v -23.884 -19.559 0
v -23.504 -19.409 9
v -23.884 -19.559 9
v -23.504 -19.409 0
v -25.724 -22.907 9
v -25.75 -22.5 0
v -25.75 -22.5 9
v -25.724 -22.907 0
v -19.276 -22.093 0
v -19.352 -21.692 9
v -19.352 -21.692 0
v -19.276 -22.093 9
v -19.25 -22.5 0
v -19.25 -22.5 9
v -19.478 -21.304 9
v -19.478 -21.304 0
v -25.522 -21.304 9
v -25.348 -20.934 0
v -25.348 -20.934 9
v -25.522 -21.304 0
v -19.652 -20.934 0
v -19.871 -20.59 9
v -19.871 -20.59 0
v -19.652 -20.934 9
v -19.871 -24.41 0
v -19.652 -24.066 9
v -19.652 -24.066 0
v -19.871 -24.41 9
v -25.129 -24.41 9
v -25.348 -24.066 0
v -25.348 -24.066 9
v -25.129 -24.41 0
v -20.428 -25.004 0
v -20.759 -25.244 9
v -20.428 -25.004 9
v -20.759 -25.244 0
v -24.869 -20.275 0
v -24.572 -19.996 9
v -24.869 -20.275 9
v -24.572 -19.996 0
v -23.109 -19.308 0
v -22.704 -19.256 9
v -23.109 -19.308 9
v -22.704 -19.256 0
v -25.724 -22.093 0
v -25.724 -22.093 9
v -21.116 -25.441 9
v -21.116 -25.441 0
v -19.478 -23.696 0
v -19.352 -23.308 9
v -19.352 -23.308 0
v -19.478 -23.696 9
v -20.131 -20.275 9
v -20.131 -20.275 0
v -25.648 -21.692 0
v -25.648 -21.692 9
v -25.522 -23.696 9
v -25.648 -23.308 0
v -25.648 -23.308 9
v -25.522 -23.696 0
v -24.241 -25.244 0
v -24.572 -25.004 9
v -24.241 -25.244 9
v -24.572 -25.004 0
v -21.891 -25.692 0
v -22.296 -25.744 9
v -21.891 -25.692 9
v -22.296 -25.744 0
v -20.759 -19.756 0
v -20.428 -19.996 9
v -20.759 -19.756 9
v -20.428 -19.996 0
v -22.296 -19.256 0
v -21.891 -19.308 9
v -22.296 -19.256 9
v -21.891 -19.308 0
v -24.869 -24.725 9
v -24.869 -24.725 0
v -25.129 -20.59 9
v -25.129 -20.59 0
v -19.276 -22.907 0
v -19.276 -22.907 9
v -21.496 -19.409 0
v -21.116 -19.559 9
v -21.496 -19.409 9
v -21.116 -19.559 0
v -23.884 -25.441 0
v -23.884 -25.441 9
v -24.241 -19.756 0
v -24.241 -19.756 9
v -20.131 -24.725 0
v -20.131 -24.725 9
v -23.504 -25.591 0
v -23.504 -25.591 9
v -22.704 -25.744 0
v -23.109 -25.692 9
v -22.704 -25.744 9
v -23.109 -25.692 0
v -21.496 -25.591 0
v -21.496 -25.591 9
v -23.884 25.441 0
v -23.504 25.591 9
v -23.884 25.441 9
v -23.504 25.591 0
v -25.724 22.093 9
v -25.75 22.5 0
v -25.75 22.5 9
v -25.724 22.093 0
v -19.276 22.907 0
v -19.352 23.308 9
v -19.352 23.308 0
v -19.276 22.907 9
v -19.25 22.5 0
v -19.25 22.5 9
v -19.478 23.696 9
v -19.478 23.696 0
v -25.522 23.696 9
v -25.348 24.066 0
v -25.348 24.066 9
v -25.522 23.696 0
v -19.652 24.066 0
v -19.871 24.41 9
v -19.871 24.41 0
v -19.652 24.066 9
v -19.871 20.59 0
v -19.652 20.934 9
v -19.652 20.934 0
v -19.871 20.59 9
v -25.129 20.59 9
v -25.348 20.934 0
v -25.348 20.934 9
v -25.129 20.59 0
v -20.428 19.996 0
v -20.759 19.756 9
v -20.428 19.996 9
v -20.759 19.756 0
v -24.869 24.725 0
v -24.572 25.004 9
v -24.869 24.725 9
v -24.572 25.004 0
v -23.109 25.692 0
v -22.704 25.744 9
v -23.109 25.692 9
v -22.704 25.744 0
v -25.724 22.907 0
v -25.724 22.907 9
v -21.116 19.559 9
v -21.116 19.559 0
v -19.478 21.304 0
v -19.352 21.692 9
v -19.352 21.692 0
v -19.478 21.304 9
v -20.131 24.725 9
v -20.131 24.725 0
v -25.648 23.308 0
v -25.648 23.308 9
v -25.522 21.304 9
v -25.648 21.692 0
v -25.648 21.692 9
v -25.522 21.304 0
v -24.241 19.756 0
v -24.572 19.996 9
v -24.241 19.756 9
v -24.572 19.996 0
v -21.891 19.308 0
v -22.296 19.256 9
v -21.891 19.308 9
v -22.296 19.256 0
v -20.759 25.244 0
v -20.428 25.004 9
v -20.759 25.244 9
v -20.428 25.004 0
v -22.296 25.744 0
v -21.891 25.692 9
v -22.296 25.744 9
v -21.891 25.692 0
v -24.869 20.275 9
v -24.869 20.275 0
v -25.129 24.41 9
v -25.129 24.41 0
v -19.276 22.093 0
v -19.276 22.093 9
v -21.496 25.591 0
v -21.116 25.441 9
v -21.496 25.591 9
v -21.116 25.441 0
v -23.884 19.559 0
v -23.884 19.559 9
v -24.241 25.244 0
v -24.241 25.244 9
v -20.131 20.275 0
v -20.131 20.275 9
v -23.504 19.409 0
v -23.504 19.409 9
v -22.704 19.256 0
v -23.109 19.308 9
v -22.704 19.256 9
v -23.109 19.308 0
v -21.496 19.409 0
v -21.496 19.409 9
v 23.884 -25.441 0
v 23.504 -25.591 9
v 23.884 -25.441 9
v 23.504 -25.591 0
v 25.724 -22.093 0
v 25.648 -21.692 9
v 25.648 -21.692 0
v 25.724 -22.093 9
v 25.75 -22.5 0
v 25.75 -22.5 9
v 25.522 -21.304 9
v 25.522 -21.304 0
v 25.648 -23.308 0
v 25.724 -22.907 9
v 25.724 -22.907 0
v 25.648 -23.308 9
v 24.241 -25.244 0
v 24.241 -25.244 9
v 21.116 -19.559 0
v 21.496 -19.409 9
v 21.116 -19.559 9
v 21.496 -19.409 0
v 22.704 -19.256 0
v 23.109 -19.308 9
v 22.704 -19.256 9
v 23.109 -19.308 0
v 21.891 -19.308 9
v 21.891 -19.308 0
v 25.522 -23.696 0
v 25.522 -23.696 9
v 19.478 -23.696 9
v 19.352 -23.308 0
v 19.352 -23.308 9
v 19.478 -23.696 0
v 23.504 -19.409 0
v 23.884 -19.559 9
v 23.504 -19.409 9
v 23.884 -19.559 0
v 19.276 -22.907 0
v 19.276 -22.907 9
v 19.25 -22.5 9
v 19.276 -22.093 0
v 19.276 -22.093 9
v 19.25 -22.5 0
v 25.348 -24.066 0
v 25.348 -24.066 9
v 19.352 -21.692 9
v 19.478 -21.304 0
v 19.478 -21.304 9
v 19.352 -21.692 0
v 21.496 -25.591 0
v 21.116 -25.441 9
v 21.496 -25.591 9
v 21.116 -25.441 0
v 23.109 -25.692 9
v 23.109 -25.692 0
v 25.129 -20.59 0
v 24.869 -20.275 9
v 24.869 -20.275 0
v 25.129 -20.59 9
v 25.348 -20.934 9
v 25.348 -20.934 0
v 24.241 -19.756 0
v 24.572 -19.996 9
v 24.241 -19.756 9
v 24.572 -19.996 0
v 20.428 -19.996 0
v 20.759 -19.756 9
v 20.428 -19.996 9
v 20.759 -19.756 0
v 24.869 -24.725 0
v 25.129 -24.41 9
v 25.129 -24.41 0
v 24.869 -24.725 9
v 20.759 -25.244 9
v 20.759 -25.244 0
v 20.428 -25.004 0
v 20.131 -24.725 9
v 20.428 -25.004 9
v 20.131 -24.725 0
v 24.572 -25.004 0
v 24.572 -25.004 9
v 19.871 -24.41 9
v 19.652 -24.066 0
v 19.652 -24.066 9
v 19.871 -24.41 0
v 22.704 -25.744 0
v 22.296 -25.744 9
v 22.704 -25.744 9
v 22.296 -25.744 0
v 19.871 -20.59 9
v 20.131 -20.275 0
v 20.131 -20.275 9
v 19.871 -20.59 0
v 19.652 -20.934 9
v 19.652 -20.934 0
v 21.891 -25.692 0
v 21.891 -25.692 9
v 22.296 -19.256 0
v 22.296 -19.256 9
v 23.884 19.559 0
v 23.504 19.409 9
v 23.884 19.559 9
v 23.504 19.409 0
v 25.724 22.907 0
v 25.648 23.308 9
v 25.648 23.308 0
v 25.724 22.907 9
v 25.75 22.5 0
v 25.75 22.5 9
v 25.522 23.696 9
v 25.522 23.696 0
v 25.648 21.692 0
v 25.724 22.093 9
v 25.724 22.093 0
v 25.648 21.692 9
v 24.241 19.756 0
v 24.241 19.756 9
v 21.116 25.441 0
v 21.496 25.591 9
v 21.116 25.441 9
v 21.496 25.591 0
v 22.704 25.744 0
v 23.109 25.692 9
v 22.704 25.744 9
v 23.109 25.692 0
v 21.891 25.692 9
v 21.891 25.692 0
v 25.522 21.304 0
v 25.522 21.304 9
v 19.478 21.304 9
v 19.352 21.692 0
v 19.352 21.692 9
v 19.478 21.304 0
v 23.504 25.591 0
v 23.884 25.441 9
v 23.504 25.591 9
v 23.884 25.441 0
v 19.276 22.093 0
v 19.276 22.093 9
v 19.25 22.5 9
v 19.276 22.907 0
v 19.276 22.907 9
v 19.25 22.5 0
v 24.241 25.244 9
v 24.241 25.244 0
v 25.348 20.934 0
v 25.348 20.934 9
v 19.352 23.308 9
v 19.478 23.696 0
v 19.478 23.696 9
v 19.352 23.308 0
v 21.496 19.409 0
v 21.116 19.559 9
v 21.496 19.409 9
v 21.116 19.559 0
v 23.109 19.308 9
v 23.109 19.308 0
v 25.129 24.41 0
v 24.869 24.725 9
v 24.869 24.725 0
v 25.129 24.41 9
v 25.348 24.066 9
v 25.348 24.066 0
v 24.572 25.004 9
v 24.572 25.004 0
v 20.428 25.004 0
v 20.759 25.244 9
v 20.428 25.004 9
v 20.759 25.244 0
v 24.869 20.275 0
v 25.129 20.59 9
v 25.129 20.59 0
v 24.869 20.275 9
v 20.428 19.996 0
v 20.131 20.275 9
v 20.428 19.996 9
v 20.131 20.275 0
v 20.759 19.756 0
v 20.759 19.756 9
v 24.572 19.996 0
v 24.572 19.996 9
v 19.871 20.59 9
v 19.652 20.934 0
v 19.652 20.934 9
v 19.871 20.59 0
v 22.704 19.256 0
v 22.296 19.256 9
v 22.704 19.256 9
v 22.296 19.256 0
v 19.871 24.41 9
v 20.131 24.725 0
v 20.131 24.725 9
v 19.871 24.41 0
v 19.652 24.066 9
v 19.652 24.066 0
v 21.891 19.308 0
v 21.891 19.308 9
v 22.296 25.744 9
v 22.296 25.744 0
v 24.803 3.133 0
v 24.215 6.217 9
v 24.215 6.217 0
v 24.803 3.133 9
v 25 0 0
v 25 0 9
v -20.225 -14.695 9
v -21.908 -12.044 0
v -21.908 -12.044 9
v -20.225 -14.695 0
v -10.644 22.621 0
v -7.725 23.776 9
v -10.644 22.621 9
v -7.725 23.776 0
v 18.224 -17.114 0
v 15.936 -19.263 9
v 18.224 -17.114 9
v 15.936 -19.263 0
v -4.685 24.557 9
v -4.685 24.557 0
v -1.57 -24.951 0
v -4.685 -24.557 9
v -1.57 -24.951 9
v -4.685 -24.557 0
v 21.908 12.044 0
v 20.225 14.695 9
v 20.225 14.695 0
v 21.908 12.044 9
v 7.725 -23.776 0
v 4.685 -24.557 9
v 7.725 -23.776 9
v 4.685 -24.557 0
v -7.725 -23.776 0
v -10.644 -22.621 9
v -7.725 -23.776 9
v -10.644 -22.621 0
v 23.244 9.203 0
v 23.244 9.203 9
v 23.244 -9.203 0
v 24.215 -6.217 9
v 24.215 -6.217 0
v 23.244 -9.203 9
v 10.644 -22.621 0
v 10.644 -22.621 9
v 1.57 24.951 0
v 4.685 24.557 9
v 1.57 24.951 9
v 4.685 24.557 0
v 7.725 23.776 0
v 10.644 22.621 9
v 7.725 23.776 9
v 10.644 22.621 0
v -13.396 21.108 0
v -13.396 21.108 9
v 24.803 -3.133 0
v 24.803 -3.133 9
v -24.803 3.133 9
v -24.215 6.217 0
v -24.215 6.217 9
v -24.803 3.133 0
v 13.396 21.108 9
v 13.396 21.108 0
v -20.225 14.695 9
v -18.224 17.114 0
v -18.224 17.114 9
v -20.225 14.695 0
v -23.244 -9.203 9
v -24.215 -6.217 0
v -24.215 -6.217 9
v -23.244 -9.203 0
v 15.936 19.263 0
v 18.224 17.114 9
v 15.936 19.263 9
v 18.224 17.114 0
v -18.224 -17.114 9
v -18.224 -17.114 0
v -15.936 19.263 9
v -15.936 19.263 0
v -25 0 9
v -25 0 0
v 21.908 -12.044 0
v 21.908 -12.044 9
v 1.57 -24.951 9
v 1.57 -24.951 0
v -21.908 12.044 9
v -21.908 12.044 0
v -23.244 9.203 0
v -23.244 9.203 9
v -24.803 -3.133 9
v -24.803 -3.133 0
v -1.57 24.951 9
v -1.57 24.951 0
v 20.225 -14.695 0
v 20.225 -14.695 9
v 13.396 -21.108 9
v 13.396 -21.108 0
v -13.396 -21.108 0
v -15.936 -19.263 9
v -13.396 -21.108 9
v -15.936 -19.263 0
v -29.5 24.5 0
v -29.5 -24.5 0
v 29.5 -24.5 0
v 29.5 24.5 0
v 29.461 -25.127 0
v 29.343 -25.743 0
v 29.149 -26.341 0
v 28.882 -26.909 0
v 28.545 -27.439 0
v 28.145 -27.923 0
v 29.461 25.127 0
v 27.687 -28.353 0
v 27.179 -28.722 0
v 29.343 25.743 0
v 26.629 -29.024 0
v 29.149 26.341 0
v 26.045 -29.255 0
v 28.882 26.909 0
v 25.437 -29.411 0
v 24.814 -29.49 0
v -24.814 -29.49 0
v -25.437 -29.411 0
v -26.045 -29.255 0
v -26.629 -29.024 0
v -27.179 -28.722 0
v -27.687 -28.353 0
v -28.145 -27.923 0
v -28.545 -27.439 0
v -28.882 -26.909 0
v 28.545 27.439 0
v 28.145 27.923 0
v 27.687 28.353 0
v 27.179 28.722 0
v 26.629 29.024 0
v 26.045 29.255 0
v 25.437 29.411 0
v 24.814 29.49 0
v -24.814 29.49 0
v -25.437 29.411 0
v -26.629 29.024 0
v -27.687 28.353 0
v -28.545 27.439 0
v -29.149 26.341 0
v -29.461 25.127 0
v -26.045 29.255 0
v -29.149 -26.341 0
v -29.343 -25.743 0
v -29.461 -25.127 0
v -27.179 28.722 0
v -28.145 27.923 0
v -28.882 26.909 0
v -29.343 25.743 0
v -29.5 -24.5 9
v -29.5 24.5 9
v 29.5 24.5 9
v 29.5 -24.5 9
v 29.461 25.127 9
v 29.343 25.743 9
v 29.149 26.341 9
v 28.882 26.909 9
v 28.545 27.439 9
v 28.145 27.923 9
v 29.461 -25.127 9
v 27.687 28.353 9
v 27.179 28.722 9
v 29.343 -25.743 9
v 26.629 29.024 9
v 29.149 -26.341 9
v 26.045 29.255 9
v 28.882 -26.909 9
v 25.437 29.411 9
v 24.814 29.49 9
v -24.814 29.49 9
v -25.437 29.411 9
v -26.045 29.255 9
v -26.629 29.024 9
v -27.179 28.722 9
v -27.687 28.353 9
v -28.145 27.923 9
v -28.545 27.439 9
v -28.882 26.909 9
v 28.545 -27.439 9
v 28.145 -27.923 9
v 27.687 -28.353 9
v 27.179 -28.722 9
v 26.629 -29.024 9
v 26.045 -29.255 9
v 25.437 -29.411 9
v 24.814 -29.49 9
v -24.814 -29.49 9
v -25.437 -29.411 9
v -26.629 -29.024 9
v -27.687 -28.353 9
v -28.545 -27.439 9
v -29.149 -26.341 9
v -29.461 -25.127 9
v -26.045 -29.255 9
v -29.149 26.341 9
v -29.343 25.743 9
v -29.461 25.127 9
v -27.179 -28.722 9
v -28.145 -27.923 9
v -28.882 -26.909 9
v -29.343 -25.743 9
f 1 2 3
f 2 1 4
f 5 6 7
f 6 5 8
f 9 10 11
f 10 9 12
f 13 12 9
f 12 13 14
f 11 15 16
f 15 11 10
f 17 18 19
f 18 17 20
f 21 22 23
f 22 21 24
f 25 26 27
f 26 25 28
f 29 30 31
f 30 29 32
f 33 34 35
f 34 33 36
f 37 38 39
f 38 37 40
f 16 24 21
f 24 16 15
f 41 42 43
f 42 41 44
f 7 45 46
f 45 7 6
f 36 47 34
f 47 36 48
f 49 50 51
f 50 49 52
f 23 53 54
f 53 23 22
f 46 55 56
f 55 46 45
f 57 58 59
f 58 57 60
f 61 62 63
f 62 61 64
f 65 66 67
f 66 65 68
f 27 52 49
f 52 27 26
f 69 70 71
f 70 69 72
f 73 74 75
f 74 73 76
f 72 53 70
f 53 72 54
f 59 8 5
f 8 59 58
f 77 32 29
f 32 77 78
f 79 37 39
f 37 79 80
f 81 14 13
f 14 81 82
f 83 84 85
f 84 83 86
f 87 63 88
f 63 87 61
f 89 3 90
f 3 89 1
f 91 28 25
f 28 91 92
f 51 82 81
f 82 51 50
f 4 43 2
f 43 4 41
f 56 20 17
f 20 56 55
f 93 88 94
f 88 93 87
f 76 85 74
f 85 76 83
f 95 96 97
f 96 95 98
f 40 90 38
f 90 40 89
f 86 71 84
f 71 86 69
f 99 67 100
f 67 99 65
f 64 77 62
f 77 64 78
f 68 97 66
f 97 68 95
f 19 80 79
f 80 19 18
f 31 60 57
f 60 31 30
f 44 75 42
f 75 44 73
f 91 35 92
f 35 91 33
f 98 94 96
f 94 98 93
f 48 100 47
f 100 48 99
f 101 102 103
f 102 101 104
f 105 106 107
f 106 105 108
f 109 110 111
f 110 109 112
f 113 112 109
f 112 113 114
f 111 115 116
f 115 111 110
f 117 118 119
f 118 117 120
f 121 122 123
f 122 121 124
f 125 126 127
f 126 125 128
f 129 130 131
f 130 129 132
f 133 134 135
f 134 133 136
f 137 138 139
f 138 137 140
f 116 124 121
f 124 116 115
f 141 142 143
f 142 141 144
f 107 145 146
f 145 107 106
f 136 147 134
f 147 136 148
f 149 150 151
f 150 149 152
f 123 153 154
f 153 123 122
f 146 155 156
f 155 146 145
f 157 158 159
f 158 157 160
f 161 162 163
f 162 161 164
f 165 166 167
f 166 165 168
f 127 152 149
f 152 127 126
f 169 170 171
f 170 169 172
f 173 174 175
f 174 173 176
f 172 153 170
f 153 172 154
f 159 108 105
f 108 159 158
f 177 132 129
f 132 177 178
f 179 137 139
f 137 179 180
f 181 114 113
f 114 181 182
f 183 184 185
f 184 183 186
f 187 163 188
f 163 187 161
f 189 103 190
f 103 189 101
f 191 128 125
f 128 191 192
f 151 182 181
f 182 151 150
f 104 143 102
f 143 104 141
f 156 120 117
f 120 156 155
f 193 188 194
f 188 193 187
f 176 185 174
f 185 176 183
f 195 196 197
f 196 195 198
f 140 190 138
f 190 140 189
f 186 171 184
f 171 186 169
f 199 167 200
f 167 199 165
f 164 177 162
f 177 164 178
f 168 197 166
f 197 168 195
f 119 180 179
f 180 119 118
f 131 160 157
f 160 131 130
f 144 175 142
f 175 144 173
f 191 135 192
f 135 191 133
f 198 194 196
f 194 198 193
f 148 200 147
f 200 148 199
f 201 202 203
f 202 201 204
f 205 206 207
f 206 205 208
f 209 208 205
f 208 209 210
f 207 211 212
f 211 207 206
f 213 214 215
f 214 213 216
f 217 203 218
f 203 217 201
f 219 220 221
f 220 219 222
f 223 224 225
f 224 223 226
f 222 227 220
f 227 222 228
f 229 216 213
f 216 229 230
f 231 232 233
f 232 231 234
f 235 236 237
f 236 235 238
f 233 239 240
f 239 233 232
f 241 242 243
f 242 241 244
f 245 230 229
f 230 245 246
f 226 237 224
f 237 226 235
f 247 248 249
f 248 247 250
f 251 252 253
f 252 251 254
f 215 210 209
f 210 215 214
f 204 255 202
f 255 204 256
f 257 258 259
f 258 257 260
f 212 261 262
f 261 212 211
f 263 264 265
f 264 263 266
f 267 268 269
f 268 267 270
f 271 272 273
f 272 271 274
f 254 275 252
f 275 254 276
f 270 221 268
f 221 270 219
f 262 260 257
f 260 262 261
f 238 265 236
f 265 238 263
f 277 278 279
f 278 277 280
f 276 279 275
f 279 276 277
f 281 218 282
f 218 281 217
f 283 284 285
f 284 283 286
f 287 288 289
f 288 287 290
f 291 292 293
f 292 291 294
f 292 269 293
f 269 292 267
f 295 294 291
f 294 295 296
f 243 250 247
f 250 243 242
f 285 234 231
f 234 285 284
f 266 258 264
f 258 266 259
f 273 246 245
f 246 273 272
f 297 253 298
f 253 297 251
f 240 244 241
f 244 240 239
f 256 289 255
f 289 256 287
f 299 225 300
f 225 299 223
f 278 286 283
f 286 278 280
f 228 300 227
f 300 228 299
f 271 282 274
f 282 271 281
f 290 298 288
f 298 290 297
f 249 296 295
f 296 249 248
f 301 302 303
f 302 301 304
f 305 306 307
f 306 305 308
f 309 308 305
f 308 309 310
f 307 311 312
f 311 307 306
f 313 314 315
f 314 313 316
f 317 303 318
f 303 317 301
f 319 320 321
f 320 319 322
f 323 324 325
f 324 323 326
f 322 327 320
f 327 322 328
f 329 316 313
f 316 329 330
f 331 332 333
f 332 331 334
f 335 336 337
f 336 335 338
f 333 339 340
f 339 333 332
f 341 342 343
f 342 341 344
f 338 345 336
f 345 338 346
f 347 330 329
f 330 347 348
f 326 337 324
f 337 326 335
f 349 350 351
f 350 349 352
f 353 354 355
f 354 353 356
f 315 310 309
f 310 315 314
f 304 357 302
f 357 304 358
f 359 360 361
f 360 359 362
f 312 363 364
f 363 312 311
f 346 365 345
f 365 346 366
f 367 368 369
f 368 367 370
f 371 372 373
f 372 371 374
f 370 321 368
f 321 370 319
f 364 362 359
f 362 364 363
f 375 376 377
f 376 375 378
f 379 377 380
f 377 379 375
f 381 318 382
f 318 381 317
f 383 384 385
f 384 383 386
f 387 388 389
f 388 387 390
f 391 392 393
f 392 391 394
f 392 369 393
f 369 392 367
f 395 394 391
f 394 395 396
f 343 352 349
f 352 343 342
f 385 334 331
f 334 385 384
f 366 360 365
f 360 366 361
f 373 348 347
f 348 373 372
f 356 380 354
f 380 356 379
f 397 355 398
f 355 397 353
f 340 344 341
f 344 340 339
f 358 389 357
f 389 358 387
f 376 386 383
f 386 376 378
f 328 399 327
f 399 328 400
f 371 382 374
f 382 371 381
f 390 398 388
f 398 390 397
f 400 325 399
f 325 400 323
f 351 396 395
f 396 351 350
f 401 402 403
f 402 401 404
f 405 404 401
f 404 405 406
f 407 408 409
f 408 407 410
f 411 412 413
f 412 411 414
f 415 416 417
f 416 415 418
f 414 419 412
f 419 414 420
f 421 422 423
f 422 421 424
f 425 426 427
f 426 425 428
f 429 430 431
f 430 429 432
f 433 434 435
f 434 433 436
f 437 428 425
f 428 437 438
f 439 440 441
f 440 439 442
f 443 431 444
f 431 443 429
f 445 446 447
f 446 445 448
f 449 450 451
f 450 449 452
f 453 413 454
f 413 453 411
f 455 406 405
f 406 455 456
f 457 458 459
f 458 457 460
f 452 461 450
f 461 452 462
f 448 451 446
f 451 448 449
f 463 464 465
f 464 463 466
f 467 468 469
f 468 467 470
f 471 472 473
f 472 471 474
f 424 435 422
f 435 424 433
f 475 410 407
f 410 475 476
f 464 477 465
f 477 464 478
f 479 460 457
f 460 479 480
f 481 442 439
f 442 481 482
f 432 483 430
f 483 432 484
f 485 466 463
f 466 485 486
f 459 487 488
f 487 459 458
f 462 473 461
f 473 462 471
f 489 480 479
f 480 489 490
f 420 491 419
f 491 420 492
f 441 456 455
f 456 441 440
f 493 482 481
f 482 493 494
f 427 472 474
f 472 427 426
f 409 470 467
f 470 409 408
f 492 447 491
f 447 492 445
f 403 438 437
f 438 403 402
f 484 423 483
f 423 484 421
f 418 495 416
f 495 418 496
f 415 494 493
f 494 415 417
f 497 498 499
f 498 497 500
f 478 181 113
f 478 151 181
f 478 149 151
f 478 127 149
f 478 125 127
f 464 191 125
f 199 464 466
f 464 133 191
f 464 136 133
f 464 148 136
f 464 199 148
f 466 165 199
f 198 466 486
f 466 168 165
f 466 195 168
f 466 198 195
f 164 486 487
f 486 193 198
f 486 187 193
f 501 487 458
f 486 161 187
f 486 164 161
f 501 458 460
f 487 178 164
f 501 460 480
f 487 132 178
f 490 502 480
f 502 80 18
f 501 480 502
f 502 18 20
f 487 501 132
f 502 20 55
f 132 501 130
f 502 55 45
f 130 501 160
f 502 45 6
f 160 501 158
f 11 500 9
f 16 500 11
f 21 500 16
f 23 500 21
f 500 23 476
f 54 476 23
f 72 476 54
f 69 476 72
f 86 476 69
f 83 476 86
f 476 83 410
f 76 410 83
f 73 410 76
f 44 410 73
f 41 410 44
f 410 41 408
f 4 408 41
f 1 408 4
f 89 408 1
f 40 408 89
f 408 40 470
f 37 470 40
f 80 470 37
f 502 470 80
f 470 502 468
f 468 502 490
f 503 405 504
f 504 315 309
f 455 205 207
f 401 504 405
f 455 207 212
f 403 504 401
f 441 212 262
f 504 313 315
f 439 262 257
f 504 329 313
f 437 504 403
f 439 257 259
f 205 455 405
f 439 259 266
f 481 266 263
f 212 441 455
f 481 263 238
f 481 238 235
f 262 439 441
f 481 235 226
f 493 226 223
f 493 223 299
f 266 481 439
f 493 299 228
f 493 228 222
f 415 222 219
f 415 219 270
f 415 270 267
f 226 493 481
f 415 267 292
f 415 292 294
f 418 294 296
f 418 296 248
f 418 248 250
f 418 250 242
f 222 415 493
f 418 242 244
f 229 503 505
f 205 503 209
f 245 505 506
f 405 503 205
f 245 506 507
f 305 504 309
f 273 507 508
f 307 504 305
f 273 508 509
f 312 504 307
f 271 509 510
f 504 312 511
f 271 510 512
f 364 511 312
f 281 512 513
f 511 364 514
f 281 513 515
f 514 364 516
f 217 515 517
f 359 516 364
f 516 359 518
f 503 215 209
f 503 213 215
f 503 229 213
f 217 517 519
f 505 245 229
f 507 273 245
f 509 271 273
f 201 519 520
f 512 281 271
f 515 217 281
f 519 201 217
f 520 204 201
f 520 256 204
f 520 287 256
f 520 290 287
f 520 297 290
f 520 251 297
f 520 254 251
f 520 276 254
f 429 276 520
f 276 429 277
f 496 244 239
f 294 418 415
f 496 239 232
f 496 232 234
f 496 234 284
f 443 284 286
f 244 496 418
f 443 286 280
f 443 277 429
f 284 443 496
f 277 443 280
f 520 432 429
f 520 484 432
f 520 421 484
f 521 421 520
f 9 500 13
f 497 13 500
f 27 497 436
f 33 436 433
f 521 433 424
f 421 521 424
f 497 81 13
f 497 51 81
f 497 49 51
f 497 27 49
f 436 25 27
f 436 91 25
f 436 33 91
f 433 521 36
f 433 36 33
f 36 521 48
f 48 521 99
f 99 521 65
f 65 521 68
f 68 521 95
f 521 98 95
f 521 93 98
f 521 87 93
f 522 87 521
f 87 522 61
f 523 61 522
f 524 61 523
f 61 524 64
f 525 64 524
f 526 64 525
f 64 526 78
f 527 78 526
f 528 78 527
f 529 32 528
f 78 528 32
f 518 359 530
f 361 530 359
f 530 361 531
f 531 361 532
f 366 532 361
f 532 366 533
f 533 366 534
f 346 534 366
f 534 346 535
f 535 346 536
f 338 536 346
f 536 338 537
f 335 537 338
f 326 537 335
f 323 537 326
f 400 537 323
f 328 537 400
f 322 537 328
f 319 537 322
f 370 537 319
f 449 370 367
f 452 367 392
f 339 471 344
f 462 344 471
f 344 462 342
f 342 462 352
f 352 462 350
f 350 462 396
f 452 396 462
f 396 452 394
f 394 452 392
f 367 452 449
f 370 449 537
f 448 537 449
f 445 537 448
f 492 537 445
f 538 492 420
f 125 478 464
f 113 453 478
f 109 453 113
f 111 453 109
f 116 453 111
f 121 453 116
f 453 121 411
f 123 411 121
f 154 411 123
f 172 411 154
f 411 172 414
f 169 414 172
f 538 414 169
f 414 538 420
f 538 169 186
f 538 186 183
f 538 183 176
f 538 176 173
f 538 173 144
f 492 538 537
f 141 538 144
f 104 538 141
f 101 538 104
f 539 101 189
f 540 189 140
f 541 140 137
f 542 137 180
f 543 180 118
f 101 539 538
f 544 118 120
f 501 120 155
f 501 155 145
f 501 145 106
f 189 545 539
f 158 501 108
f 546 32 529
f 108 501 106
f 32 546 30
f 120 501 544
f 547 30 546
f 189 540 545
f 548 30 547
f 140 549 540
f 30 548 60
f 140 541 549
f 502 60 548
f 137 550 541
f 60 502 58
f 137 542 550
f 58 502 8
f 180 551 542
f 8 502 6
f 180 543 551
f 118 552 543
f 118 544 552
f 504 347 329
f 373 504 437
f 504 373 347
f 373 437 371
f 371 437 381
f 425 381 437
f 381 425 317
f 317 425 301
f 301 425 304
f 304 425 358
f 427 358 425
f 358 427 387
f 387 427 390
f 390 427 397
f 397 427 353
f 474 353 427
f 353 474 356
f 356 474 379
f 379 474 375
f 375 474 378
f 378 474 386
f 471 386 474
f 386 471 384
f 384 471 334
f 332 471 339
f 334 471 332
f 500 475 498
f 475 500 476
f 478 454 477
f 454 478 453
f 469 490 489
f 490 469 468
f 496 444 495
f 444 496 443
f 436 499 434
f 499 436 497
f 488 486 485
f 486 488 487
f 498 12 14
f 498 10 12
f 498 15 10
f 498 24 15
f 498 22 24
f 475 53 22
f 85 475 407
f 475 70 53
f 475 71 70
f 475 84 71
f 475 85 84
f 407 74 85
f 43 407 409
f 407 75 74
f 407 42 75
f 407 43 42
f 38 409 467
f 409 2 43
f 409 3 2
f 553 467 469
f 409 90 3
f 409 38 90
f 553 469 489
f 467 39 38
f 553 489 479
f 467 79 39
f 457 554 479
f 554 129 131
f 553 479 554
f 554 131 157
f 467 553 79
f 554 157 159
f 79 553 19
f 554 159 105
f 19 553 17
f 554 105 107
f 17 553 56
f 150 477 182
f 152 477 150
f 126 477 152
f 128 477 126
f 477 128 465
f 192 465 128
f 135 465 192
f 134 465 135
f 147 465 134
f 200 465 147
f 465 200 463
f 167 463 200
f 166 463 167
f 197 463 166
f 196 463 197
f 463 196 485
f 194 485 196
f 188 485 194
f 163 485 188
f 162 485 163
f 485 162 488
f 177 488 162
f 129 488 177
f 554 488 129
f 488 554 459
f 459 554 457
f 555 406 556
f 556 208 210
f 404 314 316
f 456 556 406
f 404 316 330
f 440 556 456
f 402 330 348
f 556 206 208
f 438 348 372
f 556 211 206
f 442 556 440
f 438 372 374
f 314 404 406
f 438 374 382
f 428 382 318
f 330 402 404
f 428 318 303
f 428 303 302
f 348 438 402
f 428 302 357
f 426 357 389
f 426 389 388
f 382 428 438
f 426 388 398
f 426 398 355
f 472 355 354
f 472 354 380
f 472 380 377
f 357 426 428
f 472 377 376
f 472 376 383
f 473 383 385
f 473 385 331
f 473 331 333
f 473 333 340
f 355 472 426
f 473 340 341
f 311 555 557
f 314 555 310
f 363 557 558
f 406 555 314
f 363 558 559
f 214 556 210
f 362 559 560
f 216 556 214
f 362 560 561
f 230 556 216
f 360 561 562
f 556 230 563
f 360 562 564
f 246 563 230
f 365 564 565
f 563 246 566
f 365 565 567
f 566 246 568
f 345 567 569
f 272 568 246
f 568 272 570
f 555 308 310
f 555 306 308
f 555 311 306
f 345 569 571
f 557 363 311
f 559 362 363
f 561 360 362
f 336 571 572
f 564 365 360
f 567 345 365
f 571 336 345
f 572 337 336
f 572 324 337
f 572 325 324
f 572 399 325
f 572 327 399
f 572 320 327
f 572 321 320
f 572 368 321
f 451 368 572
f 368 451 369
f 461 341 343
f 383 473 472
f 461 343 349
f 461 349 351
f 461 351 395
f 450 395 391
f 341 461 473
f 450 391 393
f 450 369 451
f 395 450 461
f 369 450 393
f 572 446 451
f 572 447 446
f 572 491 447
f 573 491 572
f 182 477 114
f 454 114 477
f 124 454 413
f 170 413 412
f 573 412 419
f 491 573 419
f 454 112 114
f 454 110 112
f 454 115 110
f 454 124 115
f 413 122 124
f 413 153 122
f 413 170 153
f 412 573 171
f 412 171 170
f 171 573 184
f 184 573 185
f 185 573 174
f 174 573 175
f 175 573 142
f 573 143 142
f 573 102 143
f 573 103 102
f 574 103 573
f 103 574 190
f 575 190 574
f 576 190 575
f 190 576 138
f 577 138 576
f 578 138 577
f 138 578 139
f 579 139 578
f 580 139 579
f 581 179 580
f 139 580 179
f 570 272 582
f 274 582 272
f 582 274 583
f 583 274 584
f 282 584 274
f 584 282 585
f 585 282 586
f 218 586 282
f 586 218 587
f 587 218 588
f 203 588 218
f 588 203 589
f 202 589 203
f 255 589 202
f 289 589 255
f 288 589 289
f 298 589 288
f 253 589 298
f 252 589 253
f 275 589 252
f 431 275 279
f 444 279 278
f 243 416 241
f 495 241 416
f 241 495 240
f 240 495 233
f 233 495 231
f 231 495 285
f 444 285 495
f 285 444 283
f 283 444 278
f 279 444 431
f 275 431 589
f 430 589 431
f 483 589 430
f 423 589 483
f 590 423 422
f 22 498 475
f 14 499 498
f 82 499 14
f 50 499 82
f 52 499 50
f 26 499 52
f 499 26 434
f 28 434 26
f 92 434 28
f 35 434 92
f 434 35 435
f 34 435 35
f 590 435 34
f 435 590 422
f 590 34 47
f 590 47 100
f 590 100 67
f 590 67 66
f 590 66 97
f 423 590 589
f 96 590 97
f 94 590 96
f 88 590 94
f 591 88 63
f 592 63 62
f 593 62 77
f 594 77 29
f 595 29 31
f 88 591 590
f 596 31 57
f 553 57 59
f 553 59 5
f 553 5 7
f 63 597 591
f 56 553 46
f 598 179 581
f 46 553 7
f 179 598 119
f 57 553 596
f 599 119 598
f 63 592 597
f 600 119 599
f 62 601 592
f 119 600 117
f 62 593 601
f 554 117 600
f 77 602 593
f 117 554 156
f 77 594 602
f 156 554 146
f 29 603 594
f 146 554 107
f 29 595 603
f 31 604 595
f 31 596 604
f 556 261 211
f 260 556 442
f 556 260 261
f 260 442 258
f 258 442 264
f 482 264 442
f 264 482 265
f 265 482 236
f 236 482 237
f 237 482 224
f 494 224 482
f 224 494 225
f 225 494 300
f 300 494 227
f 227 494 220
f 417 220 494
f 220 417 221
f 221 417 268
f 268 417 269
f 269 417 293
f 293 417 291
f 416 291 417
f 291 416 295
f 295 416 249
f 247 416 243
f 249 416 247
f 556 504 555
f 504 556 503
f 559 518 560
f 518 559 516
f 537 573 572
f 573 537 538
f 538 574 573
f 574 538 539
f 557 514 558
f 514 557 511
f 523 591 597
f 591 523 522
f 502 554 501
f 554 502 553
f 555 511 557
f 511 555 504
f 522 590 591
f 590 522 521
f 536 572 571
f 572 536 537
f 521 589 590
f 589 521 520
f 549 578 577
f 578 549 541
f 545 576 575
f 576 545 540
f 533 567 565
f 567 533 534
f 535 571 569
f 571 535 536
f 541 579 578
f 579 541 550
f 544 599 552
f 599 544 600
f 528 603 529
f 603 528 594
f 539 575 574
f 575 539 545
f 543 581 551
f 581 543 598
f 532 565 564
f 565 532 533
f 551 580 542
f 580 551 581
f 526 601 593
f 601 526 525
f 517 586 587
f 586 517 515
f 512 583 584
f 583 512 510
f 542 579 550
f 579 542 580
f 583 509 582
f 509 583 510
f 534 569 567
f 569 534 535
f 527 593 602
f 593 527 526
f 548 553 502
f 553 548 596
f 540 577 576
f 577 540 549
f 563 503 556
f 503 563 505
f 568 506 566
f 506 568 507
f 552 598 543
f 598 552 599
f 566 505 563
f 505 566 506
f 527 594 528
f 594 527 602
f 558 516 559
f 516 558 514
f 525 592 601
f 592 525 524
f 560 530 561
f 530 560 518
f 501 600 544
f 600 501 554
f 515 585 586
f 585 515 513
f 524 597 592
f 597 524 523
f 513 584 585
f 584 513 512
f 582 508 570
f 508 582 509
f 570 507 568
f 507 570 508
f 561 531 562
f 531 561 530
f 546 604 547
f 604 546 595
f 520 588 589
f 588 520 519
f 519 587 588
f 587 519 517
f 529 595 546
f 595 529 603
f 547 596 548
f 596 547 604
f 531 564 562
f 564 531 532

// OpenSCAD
$fn = 50;

difference() {
	union() {
		hull() {
			translate(v = [-24.5, 24.5, 0]) {
				cylinder(h = 9, r = 5);
			}
			translate(v = [24.5, 24.5, 0]) {
				cylinder(h = 9, r = 5);
			}
			translate(v = [-24.5, -24.5, 0]) {
				cylinder(h = 9, r = 5);
			}
			translate(v = [24.5, -24.5, 0]) {
				cylinder(h = 9, r = 5);
			}
		}
	}
	union() {
		translate(v = [-22.5, -22.5, -100.0]) {
			cylinder(h = 200, r = 3.25);
		}
		translate(v = [-22.5, 22.5, -100.0]) {
			cylinder(h = 200, r = 3.25);
		}
		translate(v = [22.5, -22.5, -100.0]) {
			cylinder(h = 200, r = 3.25);
		}
		translate(v = [22.5, 22.5, -100.0]) {
			cylinder(h = 200, r = 3.25);
		}
		translate(v = [-22.5, -22.5, -100.0]) {
			cylinder(h = 200, r = 1.8);
		}
		translate(v = [-22.5, 22.5, -100.0]) {
			cylinder(h = 200, r = 1.8);
		}
		translate(v = [22.5, -22.5, -100.0]) {
			cylinder(h = 200, r = 1.8);
		}
		translate(v = [22.5, 22.5, -100.0]) {
			cylinder(h = 200, r = 1.8);
		}
		cylinder(h = 9, r = 25.0);
	}
}
